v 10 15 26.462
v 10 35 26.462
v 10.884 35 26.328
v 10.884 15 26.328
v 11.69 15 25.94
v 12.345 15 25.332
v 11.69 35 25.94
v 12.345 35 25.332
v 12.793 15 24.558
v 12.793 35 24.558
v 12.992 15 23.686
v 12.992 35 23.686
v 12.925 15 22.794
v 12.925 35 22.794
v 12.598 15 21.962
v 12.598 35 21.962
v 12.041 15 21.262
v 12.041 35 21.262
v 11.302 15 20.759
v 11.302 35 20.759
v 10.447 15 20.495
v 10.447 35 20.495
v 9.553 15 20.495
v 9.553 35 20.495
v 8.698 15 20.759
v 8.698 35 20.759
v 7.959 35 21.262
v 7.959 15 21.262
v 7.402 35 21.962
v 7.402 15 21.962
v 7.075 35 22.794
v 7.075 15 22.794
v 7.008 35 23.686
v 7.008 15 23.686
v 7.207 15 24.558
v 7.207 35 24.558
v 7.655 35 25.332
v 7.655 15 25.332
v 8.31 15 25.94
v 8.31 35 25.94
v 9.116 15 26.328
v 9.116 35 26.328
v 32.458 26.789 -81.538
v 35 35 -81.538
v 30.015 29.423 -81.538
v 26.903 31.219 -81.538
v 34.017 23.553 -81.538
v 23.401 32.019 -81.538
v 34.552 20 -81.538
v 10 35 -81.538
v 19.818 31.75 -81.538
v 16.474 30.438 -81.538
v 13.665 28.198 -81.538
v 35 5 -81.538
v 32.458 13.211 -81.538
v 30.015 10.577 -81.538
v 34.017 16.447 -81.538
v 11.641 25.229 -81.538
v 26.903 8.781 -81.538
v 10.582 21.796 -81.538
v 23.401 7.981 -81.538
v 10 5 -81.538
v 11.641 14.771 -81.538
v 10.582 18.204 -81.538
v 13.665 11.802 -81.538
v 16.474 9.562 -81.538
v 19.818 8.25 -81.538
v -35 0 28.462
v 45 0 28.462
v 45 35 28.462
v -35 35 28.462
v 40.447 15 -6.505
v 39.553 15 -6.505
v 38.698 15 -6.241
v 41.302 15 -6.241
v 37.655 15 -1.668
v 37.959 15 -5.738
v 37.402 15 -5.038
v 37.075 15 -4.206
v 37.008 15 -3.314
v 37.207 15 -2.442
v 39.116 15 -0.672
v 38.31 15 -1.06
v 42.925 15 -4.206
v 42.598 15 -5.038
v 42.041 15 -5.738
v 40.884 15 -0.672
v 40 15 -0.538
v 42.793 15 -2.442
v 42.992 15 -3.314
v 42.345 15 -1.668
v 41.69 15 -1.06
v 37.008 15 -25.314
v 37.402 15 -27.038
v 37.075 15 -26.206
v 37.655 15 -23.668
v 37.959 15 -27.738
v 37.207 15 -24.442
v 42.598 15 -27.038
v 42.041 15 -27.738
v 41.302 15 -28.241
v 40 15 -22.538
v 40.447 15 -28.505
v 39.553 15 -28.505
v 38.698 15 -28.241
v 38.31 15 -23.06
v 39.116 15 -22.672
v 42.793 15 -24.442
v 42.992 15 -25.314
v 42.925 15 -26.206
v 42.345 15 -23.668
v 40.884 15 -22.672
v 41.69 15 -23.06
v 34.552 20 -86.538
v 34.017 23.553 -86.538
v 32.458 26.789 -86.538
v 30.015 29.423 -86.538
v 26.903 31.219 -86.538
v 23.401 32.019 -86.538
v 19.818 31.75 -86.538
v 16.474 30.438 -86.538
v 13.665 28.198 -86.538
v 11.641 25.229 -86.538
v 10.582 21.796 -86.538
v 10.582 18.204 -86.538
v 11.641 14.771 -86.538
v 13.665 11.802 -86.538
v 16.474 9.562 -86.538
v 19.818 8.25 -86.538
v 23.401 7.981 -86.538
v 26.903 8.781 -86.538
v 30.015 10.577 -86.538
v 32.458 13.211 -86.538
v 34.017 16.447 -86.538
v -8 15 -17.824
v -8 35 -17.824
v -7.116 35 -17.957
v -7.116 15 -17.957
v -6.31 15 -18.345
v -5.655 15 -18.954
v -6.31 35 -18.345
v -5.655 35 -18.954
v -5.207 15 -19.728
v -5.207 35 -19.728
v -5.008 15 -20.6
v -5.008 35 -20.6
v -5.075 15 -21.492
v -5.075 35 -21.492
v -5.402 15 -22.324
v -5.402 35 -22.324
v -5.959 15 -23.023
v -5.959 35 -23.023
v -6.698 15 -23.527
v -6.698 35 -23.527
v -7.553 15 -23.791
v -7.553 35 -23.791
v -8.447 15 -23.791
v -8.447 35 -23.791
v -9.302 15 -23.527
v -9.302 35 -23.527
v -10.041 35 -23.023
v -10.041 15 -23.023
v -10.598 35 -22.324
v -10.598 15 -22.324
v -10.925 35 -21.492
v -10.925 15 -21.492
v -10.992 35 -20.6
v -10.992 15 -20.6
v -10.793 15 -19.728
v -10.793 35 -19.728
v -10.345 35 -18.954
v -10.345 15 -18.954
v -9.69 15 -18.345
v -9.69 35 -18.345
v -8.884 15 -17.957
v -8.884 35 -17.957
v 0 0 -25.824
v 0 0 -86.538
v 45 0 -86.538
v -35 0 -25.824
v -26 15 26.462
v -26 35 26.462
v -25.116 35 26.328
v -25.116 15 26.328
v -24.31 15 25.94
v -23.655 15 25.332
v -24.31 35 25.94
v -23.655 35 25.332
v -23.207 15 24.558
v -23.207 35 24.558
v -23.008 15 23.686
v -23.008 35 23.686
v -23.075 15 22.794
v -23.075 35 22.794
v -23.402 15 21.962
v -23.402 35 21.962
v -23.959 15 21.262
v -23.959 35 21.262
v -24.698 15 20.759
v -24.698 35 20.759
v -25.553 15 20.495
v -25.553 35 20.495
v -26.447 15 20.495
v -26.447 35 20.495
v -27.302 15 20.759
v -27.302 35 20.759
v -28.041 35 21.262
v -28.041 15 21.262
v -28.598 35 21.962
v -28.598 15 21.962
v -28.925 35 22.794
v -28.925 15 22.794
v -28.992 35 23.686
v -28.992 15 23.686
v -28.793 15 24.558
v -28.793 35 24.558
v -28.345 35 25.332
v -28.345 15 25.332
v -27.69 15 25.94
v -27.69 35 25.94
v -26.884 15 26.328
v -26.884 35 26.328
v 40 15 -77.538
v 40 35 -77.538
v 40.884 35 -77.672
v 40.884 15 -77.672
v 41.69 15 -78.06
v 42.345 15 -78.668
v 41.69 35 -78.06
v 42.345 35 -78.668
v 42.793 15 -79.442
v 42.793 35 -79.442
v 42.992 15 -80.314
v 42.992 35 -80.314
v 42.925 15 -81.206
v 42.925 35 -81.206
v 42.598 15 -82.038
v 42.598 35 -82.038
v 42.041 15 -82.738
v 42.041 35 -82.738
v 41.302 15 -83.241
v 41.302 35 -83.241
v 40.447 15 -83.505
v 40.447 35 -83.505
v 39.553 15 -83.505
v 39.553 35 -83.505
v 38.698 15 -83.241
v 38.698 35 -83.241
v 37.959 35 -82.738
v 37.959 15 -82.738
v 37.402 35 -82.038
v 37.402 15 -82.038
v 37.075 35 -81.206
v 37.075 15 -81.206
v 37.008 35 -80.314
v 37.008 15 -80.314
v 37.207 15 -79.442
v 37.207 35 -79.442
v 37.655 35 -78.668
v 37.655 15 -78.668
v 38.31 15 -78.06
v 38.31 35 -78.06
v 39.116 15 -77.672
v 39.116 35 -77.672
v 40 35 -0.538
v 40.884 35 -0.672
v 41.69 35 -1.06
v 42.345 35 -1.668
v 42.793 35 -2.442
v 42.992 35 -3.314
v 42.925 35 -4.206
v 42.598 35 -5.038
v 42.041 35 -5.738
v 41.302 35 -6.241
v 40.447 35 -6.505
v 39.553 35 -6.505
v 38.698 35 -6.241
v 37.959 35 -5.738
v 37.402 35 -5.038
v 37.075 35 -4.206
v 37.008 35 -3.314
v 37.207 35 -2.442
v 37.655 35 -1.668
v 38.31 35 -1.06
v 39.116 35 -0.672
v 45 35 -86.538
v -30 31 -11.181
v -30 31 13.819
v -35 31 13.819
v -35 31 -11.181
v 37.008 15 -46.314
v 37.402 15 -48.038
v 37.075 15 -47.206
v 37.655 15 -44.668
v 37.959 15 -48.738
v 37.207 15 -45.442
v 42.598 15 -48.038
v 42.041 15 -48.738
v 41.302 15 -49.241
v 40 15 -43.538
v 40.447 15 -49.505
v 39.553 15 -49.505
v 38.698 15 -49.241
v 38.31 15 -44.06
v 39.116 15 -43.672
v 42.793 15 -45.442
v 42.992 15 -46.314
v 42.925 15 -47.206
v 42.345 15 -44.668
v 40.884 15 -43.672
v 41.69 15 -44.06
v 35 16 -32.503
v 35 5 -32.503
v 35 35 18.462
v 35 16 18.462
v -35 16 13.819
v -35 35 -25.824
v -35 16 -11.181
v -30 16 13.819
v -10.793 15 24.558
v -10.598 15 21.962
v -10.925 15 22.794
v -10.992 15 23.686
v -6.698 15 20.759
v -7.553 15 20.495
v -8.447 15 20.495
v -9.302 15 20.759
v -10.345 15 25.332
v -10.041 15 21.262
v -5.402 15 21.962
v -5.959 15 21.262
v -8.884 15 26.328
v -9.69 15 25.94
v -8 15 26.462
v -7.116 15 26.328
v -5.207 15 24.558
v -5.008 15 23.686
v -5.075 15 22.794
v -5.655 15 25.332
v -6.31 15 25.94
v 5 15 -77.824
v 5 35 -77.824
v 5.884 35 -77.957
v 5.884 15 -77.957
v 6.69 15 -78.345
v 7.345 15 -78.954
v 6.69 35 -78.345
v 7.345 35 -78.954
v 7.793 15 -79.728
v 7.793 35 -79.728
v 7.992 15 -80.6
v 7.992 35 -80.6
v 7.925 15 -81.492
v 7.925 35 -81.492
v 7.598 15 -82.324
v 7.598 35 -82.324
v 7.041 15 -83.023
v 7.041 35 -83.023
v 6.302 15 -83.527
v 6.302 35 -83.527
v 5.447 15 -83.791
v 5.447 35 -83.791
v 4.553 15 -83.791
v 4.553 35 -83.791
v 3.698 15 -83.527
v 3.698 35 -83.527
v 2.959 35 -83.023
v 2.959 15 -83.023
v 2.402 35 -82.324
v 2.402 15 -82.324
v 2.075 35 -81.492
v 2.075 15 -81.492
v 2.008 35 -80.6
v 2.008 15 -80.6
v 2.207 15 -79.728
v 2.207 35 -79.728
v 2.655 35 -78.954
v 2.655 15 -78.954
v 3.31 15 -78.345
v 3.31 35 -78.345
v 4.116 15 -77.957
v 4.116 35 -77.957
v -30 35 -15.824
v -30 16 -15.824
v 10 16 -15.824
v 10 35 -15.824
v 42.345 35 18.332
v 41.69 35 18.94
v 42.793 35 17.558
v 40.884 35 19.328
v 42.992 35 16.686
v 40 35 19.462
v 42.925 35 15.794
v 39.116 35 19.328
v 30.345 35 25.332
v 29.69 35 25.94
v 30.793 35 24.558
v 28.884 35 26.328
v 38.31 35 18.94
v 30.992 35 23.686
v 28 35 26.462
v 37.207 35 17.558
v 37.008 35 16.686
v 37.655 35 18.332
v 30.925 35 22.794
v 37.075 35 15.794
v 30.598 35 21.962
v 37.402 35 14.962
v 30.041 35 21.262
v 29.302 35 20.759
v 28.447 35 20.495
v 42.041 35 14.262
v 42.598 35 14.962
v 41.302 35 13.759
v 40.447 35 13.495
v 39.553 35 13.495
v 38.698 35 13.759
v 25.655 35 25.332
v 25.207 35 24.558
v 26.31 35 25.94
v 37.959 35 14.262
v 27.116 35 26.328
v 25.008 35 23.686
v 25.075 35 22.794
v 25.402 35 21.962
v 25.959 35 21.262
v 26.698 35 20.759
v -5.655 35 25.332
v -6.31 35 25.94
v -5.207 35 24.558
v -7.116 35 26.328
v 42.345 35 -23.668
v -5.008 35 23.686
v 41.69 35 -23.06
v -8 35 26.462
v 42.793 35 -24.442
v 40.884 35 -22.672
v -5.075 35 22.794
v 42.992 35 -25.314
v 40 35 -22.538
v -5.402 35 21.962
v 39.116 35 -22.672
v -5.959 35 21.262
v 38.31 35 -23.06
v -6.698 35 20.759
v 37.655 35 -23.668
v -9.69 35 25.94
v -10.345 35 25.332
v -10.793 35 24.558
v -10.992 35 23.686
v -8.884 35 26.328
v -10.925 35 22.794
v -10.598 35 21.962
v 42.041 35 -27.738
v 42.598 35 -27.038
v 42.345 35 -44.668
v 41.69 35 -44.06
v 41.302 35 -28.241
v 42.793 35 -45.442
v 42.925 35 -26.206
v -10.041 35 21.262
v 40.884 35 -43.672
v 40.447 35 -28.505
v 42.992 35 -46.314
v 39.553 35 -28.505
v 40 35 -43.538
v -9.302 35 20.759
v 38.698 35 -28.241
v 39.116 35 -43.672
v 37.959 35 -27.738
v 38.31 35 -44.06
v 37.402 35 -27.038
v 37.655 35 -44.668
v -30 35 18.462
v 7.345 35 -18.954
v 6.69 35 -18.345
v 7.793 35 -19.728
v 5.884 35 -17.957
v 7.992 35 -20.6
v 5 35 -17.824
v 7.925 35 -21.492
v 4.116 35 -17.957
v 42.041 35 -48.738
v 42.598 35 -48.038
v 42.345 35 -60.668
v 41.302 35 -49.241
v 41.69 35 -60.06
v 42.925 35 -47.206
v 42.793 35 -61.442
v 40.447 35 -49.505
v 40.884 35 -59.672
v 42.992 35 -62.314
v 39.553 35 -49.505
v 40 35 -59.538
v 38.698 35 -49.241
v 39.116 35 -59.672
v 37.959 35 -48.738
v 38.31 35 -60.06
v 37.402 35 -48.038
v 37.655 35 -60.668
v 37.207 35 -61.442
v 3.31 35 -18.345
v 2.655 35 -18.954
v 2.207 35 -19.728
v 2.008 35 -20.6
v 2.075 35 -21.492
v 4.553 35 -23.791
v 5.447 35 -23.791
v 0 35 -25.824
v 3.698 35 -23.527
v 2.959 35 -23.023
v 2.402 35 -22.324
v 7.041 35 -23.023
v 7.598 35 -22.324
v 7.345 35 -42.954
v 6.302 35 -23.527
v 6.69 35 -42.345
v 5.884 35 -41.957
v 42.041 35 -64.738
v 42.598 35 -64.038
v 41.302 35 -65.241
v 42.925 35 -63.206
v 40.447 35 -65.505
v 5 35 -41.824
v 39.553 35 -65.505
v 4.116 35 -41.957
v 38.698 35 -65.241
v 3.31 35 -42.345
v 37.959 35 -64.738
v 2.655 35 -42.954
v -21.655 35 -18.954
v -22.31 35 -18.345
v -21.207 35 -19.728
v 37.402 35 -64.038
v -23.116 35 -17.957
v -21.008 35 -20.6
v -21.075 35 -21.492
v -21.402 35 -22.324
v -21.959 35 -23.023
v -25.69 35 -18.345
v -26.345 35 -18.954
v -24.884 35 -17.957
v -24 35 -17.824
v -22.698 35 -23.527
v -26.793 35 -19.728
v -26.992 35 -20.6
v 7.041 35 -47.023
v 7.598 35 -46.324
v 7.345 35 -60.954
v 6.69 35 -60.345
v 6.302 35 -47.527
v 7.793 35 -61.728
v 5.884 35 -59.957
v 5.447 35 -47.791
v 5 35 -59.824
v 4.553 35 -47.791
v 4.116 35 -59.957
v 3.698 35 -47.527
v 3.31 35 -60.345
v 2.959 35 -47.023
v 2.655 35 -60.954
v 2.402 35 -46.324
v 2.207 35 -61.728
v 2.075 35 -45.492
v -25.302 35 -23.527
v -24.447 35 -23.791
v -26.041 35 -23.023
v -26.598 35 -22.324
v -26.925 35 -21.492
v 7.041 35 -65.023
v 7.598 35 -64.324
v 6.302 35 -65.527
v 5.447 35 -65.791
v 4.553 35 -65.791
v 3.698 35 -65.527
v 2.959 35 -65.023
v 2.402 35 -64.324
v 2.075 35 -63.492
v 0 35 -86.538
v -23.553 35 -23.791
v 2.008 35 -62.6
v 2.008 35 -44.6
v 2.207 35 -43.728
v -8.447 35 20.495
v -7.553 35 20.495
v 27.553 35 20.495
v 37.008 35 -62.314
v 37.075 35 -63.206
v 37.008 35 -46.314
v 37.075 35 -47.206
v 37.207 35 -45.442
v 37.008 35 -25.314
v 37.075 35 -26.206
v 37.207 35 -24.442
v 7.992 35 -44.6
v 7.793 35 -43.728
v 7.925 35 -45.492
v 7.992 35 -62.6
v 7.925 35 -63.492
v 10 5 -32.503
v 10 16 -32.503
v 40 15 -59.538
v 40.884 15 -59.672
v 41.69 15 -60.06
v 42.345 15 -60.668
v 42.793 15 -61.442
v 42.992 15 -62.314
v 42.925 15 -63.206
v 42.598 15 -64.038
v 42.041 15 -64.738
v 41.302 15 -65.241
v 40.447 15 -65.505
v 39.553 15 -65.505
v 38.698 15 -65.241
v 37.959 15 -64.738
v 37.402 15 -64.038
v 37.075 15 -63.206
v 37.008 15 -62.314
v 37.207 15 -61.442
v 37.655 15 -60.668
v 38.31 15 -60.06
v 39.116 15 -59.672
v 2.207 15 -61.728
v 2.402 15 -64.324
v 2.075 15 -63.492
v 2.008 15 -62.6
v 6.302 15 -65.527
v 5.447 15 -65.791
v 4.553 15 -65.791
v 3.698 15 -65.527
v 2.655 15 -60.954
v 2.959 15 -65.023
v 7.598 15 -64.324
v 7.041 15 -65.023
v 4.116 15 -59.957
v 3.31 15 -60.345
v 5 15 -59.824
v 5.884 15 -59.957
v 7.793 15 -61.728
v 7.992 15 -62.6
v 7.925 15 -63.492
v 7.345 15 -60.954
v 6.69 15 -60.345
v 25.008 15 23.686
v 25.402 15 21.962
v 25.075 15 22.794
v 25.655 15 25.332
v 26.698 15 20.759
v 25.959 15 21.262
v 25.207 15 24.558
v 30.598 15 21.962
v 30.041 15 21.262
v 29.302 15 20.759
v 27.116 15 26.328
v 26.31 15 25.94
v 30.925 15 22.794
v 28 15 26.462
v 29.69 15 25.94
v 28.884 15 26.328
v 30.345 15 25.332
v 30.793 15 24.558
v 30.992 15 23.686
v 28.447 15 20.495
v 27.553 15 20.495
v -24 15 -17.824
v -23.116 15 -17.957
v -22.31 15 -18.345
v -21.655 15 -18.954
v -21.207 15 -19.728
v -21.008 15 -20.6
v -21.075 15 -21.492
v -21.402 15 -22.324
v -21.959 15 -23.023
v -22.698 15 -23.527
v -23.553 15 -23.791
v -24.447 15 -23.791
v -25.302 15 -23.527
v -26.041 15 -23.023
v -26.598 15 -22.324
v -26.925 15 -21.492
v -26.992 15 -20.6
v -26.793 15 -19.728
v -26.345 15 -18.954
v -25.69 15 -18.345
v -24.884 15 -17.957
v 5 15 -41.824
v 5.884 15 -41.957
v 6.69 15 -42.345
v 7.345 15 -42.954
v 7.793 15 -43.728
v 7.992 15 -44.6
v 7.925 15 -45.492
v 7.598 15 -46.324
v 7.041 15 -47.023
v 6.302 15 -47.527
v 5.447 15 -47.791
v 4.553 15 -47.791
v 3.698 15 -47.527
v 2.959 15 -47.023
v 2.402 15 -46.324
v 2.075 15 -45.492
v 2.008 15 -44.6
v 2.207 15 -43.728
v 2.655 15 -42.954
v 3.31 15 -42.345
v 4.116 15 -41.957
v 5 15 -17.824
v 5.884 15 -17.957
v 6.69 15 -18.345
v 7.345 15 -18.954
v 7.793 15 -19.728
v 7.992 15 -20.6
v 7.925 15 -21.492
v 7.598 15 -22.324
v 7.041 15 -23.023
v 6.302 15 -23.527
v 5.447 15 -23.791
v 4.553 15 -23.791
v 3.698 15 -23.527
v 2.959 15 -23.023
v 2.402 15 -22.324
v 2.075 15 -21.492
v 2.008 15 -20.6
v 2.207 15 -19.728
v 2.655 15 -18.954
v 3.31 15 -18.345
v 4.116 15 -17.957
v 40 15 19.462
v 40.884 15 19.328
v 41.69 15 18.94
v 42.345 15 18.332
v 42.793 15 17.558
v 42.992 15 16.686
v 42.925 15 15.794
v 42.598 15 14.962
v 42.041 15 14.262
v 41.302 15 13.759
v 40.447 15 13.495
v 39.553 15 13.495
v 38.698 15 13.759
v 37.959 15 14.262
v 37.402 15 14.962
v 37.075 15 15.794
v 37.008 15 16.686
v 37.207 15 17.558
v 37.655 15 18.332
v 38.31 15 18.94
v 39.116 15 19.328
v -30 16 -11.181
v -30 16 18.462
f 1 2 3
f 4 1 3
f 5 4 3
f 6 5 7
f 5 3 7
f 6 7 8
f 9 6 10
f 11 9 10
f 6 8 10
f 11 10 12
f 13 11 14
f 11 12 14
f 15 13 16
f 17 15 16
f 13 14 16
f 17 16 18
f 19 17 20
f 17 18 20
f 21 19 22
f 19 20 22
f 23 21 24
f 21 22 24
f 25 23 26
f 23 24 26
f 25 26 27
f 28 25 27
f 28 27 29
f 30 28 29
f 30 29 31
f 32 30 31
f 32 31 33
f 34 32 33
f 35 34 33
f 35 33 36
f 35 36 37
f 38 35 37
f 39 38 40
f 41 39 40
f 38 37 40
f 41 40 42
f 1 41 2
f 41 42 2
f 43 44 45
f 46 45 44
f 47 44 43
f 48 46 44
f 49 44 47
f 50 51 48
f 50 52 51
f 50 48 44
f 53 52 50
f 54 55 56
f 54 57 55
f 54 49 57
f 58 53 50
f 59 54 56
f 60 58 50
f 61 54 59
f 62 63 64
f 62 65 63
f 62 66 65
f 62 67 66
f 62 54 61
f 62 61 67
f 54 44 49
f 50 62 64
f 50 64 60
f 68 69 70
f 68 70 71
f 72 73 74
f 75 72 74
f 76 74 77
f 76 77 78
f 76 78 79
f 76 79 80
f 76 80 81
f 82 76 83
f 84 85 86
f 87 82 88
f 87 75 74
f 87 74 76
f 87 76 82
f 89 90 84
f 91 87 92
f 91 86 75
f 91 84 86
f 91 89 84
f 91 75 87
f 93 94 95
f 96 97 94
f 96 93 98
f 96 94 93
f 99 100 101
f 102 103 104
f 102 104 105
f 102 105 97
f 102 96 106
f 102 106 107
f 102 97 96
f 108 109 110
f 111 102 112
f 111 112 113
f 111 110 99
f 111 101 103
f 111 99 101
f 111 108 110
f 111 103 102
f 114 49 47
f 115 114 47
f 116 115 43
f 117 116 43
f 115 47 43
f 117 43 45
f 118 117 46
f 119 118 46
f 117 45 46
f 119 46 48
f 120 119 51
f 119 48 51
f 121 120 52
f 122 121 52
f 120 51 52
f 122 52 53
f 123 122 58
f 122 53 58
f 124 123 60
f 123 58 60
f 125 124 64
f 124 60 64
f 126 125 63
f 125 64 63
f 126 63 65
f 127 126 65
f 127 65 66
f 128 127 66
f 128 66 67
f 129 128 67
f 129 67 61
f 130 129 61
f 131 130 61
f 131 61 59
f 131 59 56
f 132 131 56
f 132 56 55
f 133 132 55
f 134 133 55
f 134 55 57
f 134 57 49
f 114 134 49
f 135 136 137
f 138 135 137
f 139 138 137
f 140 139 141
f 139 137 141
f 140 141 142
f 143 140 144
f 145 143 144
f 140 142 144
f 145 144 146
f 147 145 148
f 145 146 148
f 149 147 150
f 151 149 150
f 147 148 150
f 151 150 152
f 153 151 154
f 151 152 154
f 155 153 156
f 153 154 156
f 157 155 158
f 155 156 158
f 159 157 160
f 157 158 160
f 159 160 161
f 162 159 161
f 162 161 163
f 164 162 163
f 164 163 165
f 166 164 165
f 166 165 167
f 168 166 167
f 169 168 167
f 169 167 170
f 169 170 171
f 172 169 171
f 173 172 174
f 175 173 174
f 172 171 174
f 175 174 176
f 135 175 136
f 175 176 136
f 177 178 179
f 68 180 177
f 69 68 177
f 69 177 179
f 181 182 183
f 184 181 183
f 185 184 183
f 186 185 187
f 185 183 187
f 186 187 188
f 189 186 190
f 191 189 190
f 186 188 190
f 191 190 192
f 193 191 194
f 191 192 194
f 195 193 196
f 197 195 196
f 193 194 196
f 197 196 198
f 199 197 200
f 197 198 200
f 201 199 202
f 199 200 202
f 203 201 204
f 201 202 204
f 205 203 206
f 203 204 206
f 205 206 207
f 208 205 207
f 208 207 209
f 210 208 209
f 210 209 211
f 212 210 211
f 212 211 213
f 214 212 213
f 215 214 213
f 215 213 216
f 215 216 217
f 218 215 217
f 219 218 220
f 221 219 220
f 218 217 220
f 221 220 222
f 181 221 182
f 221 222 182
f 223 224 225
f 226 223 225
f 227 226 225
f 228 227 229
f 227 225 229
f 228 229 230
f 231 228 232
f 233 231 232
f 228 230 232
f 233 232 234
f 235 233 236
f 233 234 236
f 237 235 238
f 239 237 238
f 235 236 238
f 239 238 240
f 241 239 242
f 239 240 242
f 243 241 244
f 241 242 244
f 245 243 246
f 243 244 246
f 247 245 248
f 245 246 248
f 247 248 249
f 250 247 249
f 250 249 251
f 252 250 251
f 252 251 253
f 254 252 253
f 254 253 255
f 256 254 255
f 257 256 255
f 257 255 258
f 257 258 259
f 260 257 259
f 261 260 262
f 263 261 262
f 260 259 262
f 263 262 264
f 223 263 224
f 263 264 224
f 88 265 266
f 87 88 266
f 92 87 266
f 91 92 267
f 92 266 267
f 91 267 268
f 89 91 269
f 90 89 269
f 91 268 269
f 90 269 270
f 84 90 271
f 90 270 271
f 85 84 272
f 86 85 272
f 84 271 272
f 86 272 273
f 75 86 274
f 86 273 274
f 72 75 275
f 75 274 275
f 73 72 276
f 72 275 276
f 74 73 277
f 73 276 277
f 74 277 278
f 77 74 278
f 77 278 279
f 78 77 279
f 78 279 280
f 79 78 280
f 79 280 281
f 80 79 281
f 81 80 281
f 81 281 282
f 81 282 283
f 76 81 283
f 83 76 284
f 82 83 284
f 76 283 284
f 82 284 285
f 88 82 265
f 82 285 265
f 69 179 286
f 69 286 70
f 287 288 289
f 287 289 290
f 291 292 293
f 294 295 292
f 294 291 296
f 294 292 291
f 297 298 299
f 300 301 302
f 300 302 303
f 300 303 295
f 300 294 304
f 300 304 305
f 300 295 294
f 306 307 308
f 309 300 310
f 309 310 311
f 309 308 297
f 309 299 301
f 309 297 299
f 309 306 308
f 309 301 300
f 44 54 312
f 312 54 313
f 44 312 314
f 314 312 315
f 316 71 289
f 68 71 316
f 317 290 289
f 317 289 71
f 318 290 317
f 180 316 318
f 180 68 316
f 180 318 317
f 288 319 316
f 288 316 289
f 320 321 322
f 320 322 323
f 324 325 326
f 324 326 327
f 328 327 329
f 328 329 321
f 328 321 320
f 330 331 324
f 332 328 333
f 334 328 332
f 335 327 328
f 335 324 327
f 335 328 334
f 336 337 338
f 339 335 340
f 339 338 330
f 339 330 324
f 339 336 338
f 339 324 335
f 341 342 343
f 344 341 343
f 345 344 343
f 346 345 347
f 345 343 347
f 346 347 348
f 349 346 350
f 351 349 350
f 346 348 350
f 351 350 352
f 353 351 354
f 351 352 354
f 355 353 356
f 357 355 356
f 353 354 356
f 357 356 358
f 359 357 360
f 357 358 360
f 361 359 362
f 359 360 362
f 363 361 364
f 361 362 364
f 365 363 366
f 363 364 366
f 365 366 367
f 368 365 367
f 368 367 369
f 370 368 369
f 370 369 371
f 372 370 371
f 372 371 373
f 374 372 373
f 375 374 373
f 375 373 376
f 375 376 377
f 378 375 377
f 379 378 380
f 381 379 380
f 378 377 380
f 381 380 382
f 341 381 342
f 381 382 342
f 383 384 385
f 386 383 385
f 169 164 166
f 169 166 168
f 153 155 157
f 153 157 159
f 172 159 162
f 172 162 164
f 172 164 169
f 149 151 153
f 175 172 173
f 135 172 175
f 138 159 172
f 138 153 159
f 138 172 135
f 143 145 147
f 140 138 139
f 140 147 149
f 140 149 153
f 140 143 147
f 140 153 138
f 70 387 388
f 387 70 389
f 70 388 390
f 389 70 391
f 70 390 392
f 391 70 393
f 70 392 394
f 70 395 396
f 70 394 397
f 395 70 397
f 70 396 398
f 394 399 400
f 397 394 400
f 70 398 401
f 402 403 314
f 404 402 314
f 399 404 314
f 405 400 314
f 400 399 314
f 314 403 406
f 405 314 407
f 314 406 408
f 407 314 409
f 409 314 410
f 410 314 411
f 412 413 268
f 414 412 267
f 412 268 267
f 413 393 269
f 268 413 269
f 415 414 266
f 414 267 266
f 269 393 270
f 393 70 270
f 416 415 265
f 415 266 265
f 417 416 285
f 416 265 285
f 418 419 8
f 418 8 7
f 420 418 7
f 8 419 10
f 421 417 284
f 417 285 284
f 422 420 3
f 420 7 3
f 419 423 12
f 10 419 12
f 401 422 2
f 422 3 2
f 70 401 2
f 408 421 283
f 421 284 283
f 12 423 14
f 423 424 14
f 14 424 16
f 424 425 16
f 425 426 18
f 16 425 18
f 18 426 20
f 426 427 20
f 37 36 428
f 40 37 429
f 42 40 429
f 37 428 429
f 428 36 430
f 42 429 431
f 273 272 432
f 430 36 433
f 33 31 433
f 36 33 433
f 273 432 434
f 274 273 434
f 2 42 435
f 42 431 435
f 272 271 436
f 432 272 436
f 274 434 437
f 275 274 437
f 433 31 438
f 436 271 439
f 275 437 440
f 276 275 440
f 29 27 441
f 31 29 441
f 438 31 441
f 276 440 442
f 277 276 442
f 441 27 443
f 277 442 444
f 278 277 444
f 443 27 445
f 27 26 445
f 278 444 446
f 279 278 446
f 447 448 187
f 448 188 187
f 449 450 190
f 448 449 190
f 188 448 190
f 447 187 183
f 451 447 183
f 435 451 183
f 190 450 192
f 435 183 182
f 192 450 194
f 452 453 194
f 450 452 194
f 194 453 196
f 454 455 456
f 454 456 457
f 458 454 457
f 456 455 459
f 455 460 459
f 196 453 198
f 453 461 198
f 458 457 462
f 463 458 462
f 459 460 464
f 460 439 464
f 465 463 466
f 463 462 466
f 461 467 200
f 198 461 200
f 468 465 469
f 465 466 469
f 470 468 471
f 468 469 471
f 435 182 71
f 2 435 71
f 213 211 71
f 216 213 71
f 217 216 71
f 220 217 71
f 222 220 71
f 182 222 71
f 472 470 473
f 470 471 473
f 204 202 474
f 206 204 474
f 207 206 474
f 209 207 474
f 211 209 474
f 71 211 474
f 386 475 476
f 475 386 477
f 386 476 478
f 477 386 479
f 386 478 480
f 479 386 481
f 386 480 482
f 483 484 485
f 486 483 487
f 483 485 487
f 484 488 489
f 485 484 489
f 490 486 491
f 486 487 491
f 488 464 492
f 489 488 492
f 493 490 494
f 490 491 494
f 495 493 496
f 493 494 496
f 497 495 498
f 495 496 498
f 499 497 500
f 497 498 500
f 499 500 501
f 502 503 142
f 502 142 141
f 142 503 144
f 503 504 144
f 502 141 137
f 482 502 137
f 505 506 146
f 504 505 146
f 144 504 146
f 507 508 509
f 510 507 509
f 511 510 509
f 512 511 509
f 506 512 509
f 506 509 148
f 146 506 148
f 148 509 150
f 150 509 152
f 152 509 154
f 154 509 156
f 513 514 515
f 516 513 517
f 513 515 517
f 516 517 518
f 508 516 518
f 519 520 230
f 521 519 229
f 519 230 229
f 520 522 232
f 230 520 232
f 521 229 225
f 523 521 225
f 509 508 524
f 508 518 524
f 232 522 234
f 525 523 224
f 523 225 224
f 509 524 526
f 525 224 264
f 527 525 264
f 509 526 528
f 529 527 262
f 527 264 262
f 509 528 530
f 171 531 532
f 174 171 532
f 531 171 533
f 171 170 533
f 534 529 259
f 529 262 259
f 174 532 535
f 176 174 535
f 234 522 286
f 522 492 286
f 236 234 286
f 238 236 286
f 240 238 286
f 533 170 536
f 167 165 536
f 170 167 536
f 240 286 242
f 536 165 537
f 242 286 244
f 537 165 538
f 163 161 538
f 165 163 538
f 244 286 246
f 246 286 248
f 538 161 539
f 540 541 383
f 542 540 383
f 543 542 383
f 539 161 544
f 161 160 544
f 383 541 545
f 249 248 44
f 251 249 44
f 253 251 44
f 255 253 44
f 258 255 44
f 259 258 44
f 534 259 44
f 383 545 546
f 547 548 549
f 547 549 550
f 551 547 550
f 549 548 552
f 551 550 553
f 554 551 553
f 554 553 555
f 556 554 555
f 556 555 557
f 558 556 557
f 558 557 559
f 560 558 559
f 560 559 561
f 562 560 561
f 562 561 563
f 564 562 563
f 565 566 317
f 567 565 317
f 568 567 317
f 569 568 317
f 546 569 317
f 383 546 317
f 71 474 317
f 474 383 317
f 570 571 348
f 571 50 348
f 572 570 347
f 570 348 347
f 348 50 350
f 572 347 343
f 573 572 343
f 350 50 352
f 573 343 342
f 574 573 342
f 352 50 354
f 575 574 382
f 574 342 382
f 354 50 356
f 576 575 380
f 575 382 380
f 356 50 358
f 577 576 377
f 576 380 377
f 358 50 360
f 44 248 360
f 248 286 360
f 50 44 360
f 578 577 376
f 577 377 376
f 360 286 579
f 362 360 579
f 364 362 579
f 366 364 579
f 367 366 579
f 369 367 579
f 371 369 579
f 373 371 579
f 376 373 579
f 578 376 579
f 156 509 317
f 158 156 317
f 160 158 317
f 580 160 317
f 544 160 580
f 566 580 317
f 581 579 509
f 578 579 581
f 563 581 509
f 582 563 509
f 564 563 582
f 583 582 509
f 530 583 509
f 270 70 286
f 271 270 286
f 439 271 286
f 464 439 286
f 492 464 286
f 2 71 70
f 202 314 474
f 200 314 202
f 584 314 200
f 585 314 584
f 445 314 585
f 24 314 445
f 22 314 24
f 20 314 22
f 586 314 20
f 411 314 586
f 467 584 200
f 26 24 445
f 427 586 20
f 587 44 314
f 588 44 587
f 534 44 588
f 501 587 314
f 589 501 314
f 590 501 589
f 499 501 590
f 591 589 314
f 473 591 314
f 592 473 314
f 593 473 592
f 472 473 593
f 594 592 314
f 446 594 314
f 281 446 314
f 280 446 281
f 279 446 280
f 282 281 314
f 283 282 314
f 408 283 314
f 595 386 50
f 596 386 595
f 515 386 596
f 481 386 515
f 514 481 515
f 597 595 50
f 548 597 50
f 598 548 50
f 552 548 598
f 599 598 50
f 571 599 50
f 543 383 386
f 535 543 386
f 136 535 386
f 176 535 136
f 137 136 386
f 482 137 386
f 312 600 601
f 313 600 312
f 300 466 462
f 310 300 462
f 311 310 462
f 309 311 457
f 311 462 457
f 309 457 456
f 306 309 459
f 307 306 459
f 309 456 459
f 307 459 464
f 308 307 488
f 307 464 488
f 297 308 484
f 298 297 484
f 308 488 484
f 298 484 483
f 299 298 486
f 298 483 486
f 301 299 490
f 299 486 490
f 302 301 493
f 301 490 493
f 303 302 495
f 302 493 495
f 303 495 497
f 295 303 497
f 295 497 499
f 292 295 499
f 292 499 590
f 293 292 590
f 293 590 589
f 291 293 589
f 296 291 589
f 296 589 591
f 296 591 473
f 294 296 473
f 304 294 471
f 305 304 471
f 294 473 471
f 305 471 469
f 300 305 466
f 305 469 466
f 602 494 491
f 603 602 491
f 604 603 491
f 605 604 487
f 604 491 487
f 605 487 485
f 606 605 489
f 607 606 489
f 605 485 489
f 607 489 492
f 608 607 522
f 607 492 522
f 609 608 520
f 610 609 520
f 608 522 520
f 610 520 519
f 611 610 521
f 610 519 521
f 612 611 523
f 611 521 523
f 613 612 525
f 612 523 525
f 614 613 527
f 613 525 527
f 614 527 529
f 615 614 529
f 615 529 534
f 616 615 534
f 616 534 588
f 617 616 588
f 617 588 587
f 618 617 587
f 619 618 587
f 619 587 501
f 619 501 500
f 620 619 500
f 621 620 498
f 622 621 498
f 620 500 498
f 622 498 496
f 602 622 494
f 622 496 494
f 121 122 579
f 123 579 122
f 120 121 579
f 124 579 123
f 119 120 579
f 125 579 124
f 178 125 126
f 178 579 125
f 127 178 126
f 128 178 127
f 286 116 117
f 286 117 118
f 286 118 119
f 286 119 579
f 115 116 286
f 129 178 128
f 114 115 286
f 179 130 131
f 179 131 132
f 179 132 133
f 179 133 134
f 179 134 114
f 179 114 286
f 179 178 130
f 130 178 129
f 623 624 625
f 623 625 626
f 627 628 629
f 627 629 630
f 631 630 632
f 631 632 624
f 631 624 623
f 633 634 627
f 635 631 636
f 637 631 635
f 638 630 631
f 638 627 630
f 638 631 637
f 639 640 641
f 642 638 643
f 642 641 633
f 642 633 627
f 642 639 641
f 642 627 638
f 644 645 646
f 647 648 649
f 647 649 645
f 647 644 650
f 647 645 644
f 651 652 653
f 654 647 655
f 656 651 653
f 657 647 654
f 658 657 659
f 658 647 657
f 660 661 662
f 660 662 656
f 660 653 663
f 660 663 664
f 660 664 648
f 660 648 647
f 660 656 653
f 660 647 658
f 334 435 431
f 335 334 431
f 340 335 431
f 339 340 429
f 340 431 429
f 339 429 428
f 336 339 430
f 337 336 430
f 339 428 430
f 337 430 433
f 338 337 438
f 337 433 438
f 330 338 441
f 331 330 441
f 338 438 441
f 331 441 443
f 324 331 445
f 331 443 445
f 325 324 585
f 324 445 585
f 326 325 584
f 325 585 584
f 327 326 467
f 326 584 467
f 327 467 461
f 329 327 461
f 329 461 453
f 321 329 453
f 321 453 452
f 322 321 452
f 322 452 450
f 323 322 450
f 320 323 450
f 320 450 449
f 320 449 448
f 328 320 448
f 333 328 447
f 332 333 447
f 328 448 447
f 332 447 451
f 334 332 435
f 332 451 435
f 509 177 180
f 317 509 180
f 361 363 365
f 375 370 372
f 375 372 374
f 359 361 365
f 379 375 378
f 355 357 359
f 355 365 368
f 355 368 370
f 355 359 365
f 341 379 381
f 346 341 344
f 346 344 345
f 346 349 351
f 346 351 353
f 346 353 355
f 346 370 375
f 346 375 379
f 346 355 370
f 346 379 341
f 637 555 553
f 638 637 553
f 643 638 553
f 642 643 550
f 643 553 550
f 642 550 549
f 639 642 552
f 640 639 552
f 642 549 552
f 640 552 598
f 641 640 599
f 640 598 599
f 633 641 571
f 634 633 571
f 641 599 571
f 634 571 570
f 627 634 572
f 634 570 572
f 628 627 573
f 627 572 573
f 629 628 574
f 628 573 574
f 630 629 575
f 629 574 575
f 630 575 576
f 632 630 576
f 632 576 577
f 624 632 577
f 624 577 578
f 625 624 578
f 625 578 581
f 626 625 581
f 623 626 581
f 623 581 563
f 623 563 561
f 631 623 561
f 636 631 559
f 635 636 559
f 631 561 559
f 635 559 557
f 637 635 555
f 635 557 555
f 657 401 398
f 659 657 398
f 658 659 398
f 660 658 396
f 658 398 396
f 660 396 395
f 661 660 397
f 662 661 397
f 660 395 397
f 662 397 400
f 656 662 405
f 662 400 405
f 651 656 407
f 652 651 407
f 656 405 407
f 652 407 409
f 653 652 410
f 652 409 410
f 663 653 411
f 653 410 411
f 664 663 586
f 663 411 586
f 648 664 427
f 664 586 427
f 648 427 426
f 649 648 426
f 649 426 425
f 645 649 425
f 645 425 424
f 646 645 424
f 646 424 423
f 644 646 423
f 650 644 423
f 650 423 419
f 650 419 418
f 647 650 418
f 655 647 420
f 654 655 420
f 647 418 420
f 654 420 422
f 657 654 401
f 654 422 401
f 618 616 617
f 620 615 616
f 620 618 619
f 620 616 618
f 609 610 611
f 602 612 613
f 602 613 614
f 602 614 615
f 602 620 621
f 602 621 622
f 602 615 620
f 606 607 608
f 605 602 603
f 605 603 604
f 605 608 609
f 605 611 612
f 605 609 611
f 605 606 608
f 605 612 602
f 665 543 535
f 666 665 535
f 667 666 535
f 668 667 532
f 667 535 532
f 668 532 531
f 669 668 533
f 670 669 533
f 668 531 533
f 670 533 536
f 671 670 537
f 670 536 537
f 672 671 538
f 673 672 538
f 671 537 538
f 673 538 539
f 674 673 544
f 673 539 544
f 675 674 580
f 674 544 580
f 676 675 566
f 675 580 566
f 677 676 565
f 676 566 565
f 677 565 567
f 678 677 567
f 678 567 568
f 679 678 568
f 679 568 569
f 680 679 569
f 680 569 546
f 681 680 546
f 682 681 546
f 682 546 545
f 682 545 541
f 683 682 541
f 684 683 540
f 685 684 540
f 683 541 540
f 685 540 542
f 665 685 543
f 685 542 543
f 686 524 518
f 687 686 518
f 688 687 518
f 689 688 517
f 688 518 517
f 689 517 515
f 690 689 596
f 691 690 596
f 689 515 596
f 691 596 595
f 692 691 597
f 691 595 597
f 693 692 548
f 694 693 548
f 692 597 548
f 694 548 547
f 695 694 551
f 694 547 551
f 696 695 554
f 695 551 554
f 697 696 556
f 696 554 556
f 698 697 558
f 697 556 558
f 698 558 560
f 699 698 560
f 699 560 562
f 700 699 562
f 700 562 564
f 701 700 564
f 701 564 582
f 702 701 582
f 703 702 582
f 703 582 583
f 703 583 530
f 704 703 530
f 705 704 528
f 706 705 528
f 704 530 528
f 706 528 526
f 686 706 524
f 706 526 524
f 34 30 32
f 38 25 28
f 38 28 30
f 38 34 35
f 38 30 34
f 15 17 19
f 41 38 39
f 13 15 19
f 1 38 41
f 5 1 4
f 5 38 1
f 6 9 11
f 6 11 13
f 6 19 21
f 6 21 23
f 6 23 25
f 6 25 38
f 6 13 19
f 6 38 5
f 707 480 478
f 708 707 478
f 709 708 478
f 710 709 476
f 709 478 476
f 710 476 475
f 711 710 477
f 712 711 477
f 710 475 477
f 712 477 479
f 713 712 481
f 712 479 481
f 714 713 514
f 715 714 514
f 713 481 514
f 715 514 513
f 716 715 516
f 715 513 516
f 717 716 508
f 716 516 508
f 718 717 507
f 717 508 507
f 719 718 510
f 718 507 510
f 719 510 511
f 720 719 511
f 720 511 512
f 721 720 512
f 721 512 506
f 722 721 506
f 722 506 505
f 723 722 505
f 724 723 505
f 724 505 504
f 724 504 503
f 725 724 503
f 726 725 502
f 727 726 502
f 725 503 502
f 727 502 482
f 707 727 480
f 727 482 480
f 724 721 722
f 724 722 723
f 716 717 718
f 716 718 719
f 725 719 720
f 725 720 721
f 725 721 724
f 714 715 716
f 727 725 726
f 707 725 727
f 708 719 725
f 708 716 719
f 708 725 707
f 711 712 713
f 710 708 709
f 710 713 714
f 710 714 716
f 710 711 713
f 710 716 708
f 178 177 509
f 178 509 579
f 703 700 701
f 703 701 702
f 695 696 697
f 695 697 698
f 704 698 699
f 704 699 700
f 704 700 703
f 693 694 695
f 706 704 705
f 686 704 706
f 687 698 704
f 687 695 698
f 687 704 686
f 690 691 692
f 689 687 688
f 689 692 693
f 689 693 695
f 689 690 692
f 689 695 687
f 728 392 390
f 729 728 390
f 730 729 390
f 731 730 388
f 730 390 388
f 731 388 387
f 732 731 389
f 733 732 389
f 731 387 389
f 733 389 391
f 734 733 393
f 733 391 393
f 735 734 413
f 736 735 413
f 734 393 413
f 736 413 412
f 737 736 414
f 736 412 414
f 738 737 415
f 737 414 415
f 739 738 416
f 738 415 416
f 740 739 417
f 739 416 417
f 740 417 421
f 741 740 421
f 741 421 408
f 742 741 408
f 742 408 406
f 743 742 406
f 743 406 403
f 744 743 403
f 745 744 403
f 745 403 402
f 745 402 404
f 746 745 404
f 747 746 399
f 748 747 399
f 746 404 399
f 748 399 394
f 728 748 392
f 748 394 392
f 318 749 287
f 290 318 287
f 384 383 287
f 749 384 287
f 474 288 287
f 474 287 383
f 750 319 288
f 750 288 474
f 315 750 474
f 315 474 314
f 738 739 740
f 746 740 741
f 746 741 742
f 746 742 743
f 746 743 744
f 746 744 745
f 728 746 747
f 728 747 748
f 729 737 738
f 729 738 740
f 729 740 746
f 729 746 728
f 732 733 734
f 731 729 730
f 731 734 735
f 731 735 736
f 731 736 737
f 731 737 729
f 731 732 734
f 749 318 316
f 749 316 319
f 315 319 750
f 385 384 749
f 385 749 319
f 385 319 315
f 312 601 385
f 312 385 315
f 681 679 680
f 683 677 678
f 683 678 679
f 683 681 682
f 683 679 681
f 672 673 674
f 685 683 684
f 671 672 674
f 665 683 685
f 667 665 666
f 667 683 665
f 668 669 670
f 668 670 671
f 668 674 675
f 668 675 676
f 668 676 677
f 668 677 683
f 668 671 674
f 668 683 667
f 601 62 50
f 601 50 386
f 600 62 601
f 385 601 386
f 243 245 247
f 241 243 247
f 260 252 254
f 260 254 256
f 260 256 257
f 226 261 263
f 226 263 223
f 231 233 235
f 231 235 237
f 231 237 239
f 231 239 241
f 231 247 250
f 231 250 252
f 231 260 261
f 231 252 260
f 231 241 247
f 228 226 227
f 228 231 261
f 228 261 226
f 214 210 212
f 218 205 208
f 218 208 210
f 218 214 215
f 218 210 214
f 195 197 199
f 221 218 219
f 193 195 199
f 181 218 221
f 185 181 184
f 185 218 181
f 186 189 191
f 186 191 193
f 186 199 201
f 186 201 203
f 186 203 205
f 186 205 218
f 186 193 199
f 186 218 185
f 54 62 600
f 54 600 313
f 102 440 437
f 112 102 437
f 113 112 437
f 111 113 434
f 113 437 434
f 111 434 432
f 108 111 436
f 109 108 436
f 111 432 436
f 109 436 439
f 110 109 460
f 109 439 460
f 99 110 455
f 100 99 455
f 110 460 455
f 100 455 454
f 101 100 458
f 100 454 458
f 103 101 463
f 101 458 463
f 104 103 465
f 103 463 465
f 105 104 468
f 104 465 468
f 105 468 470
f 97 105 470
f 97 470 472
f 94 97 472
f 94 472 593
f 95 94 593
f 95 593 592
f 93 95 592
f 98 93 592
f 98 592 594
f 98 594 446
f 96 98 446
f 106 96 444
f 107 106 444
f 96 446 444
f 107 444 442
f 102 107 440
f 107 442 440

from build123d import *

# Parameters (mm, degrees)
EXTRUDE_1_DEPTH     = 35
EXTRUDE_2_DEPTH     = 5
SKETCH_4_R          = 3
CUT_EXTRUDE_1_DEPTH = 20
SKETCH_6_W          = 25
SKETCH_6_H          = 16.678910785
EXTRUDE_3_DEPTH     = 11
SKETCH_7_W          = 65
SKETCH_7_H          = 34.285714286
EXTRUDE_4_DEPTH     = 11
SKETCH_8_R          = 12.052464441
CUT_EXTRUDE_2_DEPTH = 11
SKETCH_9_W          = 25
SKETCH_9_H          = 15
CUT_EXTRUDE_3_DEPTH = 11


with BuildPart() as part:
    # Эскиз1 → Бобышка-Вытянуть1 (new body)
    with BuildSketch(Plane(origin=(0, 0, 0), x_dir=(1, 0, 0), z_dir=(0, 1, 0))):
        Polygon((-25.991917961, 25.824175824), (0, 25.824175824), (0, 86.538461538), (45, 86.538461538), (45, -28.461538462), (-35, -28.461538462), (-35, 25.824175824), align=None)
        Polygon((-30, -18.461538462), (35, -18.461538462), (35, 21.538461538), (35, 81.538461538), (10, 81.538461538), (10, 15.824175824), (-30, 15.824175824), align=None, mode=Mode.SUBTRACT)
    extrude(amount=EXTRUDE_1_DEPTH)

    # Эскиз3 → Бобышка-Вытянуть2 (add)
    with BuildSketch(Plane.XZ):
        Polygon((35, -81.538461538), (35, 18.461538462), (-30, 18.461538462), (-30, -15.824175824), (10, -15.824175824), (10, -81.538461538), align=None)
    extrude(amount=-EXTRUDE_2_DEPTH)

    # Эскиз4 → Вырез-Вытянуть1 (cut)
    with BuildSketch(Plane(origin=(0, 35, 0), x_dir=(1, 0, 0), z_dir=(0, 1, 0))):
        with Locations(Location((40, 80.538461538, 0), (0, 0, 270))):
            Circle(SKETCH_4_R)
        with Locations(Location((40, 62.538461538, 0), (0, 0, 270))):
            Circle(SKETCH_4_R)
        with Locations(Location((40, 46.538461538, 0), (0, 0, 270))):
            Circle(SKETCH_4_R)
        with Locations(Location((40, 25.538461538, 0), (0, 0, 270))):
            Circle(SKETCH_4_R)
        with Locations(Location((40, 3.538461538, 0), (0, 0, 270))):
            Circle(SKETCH_4_R)
        with Locations(Location((40, -16.461538462, 0), (0, 0, 270))):
            Circle(SKETCH_4_R)
        with Locations(Location((5, 80.824175824, 0), (0, 0, 270))):
            Circle(SKETCH_4_R)
        with Locations(Location((5, 62.824175824, 0), (0, 0, 270))):
            Circle(SKETCH_4_R)
        with Locations(Location((5, 44.824175824, 0), (0, 0, 270))):
            Circle(SKETCH_4_R)
        with Locations(Location((-24, 20.824175824, 0), (0, 0, 270))):
            Circle(SKETCH_4_R)
        with Locations(Location((-8, 20.824175824, 0), (0, 0, 270))):
            Circle(SKETCH_4_R)
        with Locations(Location((5, 20.824175824, 0), (0, 0, 270))):
            Circle(SKETCH_4_R)
        with Locations(Location((-26, -23.461538462, 0), (0, 0, 270))):
            Circle(SKETCH_4_R)
        with Locations(Location((-8, -23.461538462, 0), (0, 0, 270))):
            Circle(SKETCH_4_R)
        with Locations(Location((10, -23.461538462, 0), (0, 0, 270))):
            Circle(SKETCH_4_R)
        with Locations(Location((28, -23.461538462, 0), (0, 0, 270))):
            Circle(SKETCH_4_R)
    extrude(amount=-CUT_EXTRUDE_1_DEPTH, mode=Mode.SUBTRACT)

    # Эскиз6 → Бобышка-Вытянуть3 (add)
    with BuildSketch(Plane(origin=(0, 5, 0), x_dir=(1, 0, 0), z_dir=(0, 1, 0))):
        with Locations((22.5, 24.163631217)):
            Rectangle(SKETCH_6_W, SKETCH_6_H)
    extrude(amount=EXTRUDE_3_DEPTH)

    # Эскиз7 → Бобышка-Вытянуть4 (add)
    with BuildSketch(Plane(origin=(0, 5, 0), x_dir=(1, 0, 0), z_dir=(0, 1, 0))):
        with Locations((2.5, -1.318681319)):
            Rectangle(SKETCH_7_W, SKETCH_7_H)
    extrude(amount=EXTRUDE_4_DEPTH)

    # Эскиз8 → Вырез-Вытянуть2 (cut)
    with BuildSketch(Plane.XY.offset(-81.538461538)):
        with Locations((22.5, 20)):
            Circle(SKETCH_8_R)
    extrude(amount=-CUT_EXTRUDE_2_DEPTH, mode=Mode.SUBTRACT)

    # Эскиз9 → Вырез-Вытянуть3 (cut)
    with BuildSketch(Plane(origin=(-30, 0, 0), x_dir=(0, 0, -1), z_dir=(1, 0, 0))):
        with Locations((-1.318681319, 23.5)):
            Rectangle(SKETCH_9_W, SKETCH_9_H)
    extrude(amount=-CUT_EXTRUDE_3_DEPTH, mode=Mode.SUBTRACT)


solid = part.part
